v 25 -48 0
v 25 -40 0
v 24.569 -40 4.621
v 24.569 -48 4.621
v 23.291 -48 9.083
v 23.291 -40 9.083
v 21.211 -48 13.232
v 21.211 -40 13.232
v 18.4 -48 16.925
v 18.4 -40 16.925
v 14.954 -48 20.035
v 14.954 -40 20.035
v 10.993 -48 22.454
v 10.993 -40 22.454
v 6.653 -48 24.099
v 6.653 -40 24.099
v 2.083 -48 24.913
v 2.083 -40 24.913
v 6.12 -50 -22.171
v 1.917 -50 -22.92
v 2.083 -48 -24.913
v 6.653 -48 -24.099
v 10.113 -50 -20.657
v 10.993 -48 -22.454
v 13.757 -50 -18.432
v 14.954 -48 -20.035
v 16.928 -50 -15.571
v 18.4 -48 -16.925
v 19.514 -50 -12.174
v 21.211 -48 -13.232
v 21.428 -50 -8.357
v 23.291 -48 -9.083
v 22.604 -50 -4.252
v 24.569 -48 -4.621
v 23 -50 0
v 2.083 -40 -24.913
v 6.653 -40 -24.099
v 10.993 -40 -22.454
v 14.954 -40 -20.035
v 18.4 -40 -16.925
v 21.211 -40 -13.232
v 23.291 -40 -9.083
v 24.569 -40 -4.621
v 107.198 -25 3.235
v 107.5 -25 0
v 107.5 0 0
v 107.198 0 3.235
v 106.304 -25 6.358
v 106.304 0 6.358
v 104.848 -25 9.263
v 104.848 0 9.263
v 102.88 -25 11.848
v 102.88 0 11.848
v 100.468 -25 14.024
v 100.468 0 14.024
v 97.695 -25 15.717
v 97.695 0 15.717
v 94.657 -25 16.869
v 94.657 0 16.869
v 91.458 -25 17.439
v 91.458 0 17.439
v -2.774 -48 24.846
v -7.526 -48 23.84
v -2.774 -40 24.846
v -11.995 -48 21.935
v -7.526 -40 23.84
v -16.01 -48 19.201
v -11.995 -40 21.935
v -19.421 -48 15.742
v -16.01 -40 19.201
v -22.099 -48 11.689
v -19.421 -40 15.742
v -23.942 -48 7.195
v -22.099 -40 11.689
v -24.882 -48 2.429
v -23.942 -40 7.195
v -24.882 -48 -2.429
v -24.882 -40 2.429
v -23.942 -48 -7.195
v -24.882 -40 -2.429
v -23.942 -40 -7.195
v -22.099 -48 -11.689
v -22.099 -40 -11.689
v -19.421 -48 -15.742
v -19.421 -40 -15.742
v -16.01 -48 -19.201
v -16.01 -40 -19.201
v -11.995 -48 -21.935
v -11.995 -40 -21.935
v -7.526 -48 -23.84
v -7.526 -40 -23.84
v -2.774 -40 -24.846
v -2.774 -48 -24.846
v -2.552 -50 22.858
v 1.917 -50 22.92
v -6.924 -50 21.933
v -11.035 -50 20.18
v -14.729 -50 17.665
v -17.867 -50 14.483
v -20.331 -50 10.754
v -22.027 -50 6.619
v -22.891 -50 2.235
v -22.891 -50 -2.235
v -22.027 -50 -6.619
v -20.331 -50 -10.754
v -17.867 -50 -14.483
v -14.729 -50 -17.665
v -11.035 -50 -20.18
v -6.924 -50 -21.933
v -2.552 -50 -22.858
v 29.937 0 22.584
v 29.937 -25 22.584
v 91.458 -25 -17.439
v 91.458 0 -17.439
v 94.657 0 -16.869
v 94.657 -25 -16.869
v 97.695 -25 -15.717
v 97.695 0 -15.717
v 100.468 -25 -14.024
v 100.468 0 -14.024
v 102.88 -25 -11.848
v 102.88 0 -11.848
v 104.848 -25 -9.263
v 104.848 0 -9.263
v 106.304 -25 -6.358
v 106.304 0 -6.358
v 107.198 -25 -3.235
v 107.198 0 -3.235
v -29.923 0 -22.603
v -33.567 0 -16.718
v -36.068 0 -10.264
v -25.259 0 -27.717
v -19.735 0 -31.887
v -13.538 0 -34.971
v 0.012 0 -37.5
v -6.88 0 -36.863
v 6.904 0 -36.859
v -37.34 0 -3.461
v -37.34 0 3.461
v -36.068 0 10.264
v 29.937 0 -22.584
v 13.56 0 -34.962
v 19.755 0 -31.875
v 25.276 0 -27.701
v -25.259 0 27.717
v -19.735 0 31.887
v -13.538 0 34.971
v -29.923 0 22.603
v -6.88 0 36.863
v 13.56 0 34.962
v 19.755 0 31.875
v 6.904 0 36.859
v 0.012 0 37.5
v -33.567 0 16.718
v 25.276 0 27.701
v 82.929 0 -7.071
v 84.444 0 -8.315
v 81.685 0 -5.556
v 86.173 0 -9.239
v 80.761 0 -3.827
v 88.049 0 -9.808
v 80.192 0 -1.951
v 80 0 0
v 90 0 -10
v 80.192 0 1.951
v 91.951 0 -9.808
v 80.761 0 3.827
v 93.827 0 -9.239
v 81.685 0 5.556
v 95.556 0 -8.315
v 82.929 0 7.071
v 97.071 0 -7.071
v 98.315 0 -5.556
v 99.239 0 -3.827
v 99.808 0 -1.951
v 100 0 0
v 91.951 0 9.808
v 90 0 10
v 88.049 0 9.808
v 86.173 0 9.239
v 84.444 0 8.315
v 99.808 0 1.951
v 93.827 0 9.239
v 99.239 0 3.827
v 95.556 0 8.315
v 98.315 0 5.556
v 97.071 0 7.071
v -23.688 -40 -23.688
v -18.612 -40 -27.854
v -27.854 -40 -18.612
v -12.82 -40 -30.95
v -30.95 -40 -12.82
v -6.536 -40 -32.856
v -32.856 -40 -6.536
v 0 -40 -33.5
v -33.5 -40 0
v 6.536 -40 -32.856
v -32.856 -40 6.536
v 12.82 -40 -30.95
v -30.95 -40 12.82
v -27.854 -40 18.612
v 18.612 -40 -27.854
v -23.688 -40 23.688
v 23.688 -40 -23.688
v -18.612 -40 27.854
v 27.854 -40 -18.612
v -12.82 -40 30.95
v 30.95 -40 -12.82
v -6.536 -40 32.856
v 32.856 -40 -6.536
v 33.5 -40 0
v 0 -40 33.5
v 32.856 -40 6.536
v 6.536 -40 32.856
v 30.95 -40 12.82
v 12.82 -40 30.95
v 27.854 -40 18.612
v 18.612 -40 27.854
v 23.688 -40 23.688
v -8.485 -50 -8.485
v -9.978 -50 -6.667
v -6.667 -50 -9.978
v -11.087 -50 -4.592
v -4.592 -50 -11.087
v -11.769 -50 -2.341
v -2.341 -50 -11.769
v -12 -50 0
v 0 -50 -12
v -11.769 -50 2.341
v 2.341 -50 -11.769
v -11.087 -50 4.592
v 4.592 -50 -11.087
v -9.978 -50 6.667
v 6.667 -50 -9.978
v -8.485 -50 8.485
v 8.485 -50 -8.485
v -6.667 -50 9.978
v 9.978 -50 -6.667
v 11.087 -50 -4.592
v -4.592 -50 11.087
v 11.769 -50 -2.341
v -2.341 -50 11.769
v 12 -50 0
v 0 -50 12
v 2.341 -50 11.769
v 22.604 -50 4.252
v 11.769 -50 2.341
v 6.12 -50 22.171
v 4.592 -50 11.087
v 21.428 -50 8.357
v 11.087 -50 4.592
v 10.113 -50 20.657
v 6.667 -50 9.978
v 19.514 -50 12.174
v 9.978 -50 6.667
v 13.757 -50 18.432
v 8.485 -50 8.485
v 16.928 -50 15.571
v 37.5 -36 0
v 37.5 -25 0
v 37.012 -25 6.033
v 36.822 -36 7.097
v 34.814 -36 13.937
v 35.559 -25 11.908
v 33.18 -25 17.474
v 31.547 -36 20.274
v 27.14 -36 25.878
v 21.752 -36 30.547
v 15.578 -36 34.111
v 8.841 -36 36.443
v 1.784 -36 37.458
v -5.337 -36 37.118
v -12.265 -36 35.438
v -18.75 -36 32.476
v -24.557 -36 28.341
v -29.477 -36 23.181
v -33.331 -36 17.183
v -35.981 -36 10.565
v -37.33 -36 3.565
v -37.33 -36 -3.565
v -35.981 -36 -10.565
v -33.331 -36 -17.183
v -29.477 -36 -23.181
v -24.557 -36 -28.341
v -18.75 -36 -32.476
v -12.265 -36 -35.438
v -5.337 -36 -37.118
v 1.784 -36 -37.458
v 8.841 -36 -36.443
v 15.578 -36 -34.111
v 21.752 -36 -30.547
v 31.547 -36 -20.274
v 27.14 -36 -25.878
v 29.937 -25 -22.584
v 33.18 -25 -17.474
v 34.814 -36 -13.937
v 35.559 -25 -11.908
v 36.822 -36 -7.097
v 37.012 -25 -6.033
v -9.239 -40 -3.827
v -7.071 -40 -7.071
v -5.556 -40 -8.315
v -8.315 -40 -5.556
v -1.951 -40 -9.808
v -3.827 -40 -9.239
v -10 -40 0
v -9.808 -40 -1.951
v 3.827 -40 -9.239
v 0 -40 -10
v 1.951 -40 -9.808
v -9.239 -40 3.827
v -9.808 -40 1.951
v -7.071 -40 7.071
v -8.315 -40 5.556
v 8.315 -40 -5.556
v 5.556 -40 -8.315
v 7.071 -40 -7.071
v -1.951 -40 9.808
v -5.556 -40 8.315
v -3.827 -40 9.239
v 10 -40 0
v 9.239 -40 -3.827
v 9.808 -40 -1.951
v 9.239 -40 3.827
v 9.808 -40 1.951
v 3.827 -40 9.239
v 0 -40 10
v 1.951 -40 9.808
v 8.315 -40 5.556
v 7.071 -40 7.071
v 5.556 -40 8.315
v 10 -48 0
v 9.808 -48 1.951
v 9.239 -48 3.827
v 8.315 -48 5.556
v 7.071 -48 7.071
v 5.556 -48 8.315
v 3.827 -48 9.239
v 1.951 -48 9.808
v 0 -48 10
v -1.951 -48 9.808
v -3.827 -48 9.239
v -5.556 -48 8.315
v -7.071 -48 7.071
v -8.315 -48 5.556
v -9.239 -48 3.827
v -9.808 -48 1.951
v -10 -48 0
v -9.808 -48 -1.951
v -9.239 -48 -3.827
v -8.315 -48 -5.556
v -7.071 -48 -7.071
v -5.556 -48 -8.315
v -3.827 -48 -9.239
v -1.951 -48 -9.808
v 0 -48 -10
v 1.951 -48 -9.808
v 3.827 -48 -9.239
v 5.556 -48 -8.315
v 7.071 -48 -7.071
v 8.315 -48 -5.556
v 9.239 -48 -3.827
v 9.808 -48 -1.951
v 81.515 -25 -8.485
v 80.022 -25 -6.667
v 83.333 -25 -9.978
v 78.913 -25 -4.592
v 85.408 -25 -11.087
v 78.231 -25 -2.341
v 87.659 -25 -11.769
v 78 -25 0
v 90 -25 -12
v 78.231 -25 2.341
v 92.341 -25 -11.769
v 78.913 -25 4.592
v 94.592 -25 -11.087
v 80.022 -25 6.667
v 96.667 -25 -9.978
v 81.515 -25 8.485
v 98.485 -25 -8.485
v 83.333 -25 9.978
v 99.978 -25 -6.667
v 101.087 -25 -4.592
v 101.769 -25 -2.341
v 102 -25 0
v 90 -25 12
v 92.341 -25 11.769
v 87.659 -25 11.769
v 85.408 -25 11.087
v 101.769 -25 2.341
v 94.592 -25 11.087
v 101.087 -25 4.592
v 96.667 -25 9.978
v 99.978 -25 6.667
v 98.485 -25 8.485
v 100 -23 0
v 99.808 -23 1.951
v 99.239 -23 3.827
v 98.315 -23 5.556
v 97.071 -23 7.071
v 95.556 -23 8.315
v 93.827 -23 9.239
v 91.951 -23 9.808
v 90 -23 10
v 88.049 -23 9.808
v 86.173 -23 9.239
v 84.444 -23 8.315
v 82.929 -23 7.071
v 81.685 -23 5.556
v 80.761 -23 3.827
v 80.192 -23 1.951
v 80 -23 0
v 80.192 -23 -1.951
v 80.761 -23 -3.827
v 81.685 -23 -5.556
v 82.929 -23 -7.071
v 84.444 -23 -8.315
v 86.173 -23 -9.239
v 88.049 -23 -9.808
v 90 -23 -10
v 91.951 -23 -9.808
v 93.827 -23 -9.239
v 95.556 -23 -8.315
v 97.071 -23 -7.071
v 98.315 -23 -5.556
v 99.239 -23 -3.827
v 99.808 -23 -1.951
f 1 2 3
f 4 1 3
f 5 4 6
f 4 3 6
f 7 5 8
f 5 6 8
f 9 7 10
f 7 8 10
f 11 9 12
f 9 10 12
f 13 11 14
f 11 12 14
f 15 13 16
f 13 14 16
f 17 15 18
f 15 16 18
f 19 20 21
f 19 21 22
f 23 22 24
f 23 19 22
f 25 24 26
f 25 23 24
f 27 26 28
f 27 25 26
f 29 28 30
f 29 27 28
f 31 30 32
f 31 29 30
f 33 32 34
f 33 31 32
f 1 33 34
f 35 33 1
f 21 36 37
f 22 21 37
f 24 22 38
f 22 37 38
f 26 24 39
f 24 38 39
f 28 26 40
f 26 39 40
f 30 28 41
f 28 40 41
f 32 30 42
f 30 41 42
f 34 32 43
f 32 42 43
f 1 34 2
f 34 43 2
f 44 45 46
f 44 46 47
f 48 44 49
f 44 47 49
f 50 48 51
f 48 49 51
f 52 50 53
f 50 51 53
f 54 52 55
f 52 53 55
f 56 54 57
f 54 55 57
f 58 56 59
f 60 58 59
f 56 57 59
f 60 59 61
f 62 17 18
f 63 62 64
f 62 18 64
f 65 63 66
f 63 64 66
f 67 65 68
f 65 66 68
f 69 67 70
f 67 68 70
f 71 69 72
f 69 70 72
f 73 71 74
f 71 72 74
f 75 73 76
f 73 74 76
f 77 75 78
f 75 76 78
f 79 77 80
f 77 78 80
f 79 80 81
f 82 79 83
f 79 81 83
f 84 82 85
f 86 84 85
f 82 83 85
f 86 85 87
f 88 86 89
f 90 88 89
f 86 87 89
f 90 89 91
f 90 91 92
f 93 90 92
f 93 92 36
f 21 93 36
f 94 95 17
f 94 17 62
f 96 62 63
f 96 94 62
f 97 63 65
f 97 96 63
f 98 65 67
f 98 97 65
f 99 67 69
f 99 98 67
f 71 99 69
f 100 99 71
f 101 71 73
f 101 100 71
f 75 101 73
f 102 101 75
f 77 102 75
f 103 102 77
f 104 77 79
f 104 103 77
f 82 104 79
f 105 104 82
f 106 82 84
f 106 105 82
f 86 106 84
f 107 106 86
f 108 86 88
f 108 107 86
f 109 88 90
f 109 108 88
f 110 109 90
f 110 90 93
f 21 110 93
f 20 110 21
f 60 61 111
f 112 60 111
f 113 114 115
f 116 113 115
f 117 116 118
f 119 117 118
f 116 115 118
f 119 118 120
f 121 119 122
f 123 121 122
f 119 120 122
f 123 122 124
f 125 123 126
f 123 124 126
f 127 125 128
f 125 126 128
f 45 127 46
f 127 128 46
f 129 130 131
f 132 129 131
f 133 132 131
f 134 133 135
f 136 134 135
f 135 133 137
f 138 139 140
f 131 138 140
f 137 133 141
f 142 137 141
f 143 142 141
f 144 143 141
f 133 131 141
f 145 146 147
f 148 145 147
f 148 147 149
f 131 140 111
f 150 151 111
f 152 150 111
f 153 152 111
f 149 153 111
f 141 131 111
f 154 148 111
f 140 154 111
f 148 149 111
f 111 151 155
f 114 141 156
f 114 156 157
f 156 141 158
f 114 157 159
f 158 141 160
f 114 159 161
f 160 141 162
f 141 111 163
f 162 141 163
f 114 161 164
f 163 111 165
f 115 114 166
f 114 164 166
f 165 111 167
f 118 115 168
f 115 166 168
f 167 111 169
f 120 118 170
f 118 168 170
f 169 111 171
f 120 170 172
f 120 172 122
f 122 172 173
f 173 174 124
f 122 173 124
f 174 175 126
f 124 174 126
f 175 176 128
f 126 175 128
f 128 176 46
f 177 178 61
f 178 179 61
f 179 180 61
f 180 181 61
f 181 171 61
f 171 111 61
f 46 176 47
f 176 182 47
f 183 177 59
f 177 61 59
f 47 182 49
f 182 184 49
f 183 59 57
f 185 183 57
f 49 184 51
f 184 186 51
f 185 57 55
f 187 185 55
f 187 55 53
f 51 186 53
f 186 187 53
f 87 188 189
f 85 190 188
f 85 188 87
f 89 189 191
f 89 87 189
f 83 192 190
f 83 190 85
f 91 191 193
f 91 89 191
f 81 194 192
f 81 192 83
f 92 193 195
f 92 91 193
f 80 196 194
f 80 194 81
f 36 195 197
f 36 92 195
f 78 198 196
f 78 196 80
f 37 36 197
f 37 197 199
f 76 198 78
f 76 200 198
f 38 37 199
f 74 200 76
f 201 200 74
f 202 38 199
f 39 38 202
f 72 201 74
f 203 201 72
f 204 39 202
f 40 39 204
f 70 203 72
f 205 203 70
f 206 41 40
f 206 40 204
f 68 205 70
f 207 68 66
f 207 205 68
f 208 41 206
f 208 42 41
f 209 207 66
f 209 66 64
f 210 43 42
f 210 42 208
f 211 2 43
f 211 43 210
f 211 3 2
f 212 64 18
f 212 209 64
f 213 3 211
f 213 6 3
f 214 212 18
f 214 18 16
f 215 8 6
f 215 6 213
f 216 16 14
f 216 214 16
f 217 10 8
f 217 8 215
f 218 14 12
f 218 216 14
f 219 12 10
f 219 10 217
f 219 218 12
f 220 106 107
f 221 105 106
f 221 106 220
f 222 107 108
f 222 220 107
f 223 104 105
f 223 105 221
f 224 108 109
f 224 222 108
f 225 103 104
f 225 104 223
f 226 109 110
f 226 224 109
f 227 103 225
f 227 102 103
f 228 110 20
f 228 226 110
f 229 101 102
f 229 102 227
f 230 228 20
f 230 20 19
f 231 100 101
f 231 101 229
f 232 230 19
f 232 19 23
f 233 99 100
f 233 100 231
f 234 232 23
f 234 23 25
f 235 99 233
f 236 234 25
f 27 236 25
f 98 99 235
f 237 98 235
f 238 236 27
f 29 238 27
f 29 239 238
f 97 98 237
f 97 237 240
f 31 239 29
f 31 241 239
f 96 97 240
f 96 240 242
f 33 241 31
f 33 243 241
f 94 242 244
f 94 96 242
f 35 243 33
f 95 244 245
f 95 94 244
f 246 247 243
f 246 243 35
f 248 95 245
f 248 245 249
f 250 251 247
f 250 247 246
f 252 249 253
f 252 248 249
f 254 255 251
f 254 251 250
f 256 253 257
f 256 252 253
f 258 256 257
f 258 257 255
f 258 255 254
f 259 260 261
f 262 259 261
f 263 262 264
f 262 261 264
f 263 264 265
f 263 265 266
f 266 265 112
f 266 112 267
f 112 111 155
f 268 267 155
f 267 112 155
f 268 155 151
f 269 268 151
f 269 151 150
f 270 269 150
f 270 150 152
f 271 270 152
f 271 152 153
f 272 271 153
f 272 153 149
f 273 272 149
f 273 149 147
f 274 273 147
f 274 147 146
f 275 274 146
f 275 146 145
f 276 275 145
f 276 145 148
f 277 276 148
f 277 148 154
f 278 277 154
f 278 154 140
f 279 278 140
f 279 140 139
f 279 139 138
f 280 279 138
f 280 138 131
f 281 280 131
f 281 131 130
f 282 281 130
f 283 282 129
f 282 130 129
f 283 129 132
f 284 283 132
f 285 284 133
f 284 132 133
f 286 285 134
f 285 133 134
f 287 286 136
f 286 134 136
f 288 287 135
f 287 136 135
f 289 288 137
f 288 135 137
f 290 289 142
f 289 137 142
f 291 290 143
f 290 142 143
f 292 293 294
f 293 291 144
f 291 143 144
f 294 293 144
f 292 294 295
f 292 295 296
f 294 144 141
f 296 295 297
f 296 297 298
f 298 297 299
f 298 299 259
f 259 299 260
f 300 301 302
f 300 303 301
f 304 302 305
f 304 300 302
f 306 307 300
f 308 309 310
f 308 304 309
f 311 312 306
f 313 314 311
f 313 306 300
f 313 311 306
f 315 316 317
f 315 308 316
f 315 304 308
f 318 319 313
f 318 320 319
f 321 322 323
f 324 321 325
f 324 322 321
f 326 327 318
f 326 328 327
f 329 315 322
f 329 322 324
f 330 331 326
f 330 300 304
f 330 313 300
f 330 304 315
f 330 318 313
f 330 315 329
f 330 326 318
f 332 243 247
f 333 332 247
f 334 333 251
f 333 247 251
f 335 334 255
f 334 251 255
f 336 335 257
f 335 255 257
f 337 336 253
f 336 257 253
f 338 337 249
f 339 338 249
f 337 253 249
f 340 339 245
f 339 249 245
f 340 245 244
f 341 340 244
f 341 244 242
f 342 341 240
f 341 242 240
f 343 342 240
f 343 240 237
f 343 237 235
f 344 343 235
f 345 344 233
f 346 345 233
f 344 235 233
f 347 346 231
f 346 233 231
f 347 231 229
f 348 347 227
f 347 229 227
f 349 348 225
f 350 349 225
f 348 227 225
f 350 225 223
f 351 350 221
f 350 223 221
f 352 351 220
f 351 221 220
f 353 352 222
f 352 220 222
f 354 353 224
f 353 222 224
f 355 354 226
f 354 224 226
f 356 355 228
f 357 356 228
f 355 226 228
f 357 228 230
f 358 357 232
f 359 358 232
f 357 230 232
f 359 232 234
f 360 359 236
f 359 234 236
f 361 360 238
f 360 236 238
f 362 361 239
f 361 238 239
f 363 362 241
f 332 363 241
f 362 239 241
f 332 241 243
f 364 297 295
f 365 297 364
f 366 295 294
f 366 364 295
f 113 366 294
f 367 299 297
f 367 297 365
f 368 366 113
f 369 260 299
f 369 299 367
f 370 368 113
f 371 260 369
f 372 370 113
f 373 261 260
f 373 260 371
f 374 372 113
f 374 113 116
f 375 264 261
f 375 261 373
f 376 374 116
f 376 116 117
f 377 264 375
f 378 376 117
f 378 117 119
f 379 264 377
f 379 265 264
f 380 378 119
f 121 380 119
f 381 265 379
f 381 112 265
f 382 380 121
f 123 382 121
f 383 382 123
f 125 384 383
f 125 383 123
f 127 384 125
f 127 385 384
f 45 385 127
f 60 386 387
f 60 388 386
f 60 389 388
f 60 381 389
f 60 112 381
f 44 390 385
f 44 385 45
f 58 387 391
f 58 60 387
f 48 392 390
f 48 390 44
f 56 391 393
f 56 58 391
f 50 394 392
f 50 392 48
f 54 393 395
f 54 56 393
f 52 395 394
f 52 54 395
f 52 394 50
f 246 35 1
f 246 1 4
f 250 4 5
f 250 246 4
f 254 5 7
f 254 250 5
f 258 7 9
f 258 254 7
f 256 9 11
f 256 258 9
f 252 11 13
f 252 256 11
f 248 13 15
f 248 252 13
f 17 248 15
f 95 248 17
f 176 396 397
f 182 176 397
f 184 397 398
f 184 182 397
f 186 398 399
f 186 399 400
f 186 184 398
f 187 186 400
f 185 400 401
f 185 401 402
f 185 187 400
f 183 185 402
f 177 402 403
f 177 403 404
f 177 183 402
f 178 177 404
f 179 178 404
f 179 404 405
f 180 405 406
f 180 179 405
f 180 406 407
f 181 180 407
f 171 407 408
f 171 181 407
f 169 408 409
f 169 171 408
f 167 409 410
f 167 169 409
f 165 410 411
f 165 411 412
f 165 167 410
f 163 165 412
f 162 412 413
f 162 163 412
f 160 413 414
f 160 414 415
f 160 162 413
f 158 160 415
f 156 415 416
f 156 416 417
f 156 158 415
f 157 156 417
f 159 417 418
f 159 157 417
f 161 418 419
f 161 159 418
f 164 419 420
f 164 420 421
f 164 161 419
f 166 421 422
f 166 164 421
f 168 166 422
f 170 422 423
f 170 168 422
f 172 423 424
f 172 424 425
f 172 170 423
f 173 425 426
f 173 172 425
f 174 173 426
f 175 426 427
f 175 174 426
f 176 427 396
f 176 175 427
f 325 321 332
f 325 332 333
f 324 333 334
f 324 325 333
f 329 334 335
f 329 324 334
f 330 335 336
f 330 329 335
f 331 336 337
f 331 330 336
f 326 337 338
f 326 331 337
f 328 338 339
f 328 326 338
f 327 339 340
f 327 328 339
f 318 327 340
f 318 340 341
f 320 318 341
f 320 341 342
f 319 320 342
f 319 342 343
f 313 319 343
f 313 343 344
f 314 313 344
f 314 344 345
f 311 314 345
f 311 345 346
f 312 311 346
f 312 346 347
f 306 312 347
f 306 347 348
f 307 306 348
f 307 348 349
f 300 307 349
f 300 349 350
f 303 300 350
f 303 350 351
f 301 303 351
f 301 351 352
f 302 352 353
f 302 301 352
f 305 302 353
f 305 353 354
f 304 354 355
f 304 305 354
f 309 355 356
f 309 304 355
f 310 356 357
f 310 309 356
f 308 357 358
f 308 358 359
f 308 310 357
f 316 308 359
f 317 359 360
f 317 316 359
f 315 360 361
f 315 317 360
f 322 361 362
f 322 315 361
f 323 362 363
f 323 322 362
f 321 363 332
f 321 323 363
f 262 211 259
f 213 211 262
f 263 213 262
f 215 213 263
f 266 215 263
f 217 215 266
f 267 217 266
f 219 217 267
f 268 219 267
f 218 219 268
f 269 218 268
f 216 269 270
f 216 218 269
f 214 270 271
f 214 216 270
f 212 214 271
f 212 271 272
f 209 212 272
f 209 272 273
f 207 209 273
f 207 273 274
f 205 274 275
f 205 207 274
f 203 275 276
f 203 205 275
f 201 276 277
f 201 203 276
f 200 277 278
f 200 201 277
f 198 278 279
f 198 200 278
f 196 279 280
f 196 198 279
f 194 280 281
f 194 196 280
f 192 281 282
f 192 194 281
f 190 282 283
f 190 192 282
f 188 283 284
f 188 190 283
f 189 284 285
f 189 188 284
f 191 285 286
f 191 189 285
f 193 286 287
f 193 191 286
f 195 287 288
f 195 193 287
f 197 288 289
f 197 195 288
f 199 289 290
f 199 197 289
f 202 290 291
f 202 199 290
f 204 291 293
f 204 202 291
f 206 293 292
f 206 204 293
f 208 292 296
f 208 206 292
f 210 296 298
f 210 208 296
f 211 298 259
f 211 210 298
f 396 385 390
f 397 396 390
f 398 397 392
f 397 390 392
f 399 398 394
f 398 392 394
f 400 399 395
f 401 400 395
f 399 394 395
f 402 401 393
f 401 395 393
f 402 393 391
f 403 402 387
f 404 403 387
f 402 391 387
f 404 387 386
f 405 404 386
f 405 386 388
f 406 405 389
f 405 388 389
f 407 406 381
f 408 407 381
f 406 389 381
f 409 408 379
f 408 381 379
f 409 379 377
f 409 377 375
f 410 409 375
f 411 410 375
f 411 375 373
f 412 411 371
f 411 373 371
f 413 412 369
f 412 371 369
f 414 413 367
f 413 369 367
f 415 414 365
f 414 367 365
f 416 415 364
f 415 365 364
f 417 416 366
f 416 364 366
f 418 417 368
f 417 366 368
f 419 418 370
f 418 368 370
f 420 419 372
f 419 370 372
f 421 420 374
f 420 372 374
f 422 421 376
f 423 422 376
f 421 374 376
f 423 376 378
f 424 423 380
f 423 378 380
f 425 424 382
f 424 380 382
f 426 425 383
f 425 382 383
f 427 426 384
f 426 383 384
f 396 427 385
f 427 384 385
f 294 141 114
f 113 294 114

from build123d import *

# Parameters (mm, degrees)
F0_R     = 10
F1_DEPTH = 25
F2_DEPTH = 50
F3_SIZE  = 2
F4_R     = 37.5
F5_DEPTH = 40
F6_SIZE  = 4


with BuildPart() as f1:
    # F0 (on Front) → F1 (new body)
    with BuildSketch(Plane.XZ):
        with BuildLine():
            ThreePointArc((2.083333, -24.913043), (18.399502, -16.92508), (25, 0))
            ThreePointArc((25, 0), (18.399502, 16.92508), (2.083333, 24.913043))
            ThreePointArc((2.083333, 24.913043), (-25, 0), (2.083333, -24.913043))
        make_face()
        Circle(F0_R, mode=Mode.SUBTRACT)
        with BuildLine():
            ThreePointArc((2.083333, 24.913043), (18.399502, 16.92508), (25, 0))
            ThreePointArc((25, 0), (18.399502, -16.92508), (2.083333, -24.913043))
            Line((2.083333, -24.913043), (91.458333, -17.43913))
            ThreePointArc((91.458333, -17.43913), (72.5, 0), (91.458333, 17.43913))
            Line((91.458333, 17.43913), (2.083333, 24.913043))
        make_face()
        with BuildLine():
            ThreePointArc((107.5, 0), (102.879651, 11.847556), (91.458333, 17.43913))
            ThreePointArc((91.458333, 17.43913), (72.5, 0), (91.458333, -17.43913))
            ThreePointArc((91.458333, -17.43913), (102.879651, -11.847556), (107.5, 0))
        make_face()
        with Locations((90, 0)):
            Circle(F0_R, mode=Mode.SUBTRACT)
    extrude(amount=F1_DEPTH)

    # F0 (on Front) → F2 (join)
    with BuildSketch(Plane.XZ):
        with BuildLine():
            ThreePointArc((2.083333, -24.913043), (18.399502, -16.92508), (25, 0))
            ThreePointArc((25, 0), (18.399502, 16.92508), (2.083333, 24.913043))
            ThreePointArc((2.083333, 24.913043), (-25, 0), (2.083333, -24.913043))
        make_face()
        Circle(F0_R, mode=Mode.SUBTRACT)
    extrude(amount=F2_DEPTH)

    # F3
    f3_edges = [f1.edges().sort_by_distance(p)[0] for p in [
        (-2.083333, -50, 24.913043),
        (-10, -50, 0),
        (80, -25, 0),
    ]]
    chamfer(f3_edges, length=F3_SIZE)

    # F4 (on Front) → F5 (join)
    with BuildSketch(Plane.XZ):
        Circle(F4_R)
    extrude(amount=F5_DEPTH)

    # F6
    f6_edges = [f1.edges().sort_by_distance(p)[0] for p in [
        (-37.5, -40, 0),
    ]]
    chamfer(f6_edges, length=F6_SIZE)


solid = f1.part
